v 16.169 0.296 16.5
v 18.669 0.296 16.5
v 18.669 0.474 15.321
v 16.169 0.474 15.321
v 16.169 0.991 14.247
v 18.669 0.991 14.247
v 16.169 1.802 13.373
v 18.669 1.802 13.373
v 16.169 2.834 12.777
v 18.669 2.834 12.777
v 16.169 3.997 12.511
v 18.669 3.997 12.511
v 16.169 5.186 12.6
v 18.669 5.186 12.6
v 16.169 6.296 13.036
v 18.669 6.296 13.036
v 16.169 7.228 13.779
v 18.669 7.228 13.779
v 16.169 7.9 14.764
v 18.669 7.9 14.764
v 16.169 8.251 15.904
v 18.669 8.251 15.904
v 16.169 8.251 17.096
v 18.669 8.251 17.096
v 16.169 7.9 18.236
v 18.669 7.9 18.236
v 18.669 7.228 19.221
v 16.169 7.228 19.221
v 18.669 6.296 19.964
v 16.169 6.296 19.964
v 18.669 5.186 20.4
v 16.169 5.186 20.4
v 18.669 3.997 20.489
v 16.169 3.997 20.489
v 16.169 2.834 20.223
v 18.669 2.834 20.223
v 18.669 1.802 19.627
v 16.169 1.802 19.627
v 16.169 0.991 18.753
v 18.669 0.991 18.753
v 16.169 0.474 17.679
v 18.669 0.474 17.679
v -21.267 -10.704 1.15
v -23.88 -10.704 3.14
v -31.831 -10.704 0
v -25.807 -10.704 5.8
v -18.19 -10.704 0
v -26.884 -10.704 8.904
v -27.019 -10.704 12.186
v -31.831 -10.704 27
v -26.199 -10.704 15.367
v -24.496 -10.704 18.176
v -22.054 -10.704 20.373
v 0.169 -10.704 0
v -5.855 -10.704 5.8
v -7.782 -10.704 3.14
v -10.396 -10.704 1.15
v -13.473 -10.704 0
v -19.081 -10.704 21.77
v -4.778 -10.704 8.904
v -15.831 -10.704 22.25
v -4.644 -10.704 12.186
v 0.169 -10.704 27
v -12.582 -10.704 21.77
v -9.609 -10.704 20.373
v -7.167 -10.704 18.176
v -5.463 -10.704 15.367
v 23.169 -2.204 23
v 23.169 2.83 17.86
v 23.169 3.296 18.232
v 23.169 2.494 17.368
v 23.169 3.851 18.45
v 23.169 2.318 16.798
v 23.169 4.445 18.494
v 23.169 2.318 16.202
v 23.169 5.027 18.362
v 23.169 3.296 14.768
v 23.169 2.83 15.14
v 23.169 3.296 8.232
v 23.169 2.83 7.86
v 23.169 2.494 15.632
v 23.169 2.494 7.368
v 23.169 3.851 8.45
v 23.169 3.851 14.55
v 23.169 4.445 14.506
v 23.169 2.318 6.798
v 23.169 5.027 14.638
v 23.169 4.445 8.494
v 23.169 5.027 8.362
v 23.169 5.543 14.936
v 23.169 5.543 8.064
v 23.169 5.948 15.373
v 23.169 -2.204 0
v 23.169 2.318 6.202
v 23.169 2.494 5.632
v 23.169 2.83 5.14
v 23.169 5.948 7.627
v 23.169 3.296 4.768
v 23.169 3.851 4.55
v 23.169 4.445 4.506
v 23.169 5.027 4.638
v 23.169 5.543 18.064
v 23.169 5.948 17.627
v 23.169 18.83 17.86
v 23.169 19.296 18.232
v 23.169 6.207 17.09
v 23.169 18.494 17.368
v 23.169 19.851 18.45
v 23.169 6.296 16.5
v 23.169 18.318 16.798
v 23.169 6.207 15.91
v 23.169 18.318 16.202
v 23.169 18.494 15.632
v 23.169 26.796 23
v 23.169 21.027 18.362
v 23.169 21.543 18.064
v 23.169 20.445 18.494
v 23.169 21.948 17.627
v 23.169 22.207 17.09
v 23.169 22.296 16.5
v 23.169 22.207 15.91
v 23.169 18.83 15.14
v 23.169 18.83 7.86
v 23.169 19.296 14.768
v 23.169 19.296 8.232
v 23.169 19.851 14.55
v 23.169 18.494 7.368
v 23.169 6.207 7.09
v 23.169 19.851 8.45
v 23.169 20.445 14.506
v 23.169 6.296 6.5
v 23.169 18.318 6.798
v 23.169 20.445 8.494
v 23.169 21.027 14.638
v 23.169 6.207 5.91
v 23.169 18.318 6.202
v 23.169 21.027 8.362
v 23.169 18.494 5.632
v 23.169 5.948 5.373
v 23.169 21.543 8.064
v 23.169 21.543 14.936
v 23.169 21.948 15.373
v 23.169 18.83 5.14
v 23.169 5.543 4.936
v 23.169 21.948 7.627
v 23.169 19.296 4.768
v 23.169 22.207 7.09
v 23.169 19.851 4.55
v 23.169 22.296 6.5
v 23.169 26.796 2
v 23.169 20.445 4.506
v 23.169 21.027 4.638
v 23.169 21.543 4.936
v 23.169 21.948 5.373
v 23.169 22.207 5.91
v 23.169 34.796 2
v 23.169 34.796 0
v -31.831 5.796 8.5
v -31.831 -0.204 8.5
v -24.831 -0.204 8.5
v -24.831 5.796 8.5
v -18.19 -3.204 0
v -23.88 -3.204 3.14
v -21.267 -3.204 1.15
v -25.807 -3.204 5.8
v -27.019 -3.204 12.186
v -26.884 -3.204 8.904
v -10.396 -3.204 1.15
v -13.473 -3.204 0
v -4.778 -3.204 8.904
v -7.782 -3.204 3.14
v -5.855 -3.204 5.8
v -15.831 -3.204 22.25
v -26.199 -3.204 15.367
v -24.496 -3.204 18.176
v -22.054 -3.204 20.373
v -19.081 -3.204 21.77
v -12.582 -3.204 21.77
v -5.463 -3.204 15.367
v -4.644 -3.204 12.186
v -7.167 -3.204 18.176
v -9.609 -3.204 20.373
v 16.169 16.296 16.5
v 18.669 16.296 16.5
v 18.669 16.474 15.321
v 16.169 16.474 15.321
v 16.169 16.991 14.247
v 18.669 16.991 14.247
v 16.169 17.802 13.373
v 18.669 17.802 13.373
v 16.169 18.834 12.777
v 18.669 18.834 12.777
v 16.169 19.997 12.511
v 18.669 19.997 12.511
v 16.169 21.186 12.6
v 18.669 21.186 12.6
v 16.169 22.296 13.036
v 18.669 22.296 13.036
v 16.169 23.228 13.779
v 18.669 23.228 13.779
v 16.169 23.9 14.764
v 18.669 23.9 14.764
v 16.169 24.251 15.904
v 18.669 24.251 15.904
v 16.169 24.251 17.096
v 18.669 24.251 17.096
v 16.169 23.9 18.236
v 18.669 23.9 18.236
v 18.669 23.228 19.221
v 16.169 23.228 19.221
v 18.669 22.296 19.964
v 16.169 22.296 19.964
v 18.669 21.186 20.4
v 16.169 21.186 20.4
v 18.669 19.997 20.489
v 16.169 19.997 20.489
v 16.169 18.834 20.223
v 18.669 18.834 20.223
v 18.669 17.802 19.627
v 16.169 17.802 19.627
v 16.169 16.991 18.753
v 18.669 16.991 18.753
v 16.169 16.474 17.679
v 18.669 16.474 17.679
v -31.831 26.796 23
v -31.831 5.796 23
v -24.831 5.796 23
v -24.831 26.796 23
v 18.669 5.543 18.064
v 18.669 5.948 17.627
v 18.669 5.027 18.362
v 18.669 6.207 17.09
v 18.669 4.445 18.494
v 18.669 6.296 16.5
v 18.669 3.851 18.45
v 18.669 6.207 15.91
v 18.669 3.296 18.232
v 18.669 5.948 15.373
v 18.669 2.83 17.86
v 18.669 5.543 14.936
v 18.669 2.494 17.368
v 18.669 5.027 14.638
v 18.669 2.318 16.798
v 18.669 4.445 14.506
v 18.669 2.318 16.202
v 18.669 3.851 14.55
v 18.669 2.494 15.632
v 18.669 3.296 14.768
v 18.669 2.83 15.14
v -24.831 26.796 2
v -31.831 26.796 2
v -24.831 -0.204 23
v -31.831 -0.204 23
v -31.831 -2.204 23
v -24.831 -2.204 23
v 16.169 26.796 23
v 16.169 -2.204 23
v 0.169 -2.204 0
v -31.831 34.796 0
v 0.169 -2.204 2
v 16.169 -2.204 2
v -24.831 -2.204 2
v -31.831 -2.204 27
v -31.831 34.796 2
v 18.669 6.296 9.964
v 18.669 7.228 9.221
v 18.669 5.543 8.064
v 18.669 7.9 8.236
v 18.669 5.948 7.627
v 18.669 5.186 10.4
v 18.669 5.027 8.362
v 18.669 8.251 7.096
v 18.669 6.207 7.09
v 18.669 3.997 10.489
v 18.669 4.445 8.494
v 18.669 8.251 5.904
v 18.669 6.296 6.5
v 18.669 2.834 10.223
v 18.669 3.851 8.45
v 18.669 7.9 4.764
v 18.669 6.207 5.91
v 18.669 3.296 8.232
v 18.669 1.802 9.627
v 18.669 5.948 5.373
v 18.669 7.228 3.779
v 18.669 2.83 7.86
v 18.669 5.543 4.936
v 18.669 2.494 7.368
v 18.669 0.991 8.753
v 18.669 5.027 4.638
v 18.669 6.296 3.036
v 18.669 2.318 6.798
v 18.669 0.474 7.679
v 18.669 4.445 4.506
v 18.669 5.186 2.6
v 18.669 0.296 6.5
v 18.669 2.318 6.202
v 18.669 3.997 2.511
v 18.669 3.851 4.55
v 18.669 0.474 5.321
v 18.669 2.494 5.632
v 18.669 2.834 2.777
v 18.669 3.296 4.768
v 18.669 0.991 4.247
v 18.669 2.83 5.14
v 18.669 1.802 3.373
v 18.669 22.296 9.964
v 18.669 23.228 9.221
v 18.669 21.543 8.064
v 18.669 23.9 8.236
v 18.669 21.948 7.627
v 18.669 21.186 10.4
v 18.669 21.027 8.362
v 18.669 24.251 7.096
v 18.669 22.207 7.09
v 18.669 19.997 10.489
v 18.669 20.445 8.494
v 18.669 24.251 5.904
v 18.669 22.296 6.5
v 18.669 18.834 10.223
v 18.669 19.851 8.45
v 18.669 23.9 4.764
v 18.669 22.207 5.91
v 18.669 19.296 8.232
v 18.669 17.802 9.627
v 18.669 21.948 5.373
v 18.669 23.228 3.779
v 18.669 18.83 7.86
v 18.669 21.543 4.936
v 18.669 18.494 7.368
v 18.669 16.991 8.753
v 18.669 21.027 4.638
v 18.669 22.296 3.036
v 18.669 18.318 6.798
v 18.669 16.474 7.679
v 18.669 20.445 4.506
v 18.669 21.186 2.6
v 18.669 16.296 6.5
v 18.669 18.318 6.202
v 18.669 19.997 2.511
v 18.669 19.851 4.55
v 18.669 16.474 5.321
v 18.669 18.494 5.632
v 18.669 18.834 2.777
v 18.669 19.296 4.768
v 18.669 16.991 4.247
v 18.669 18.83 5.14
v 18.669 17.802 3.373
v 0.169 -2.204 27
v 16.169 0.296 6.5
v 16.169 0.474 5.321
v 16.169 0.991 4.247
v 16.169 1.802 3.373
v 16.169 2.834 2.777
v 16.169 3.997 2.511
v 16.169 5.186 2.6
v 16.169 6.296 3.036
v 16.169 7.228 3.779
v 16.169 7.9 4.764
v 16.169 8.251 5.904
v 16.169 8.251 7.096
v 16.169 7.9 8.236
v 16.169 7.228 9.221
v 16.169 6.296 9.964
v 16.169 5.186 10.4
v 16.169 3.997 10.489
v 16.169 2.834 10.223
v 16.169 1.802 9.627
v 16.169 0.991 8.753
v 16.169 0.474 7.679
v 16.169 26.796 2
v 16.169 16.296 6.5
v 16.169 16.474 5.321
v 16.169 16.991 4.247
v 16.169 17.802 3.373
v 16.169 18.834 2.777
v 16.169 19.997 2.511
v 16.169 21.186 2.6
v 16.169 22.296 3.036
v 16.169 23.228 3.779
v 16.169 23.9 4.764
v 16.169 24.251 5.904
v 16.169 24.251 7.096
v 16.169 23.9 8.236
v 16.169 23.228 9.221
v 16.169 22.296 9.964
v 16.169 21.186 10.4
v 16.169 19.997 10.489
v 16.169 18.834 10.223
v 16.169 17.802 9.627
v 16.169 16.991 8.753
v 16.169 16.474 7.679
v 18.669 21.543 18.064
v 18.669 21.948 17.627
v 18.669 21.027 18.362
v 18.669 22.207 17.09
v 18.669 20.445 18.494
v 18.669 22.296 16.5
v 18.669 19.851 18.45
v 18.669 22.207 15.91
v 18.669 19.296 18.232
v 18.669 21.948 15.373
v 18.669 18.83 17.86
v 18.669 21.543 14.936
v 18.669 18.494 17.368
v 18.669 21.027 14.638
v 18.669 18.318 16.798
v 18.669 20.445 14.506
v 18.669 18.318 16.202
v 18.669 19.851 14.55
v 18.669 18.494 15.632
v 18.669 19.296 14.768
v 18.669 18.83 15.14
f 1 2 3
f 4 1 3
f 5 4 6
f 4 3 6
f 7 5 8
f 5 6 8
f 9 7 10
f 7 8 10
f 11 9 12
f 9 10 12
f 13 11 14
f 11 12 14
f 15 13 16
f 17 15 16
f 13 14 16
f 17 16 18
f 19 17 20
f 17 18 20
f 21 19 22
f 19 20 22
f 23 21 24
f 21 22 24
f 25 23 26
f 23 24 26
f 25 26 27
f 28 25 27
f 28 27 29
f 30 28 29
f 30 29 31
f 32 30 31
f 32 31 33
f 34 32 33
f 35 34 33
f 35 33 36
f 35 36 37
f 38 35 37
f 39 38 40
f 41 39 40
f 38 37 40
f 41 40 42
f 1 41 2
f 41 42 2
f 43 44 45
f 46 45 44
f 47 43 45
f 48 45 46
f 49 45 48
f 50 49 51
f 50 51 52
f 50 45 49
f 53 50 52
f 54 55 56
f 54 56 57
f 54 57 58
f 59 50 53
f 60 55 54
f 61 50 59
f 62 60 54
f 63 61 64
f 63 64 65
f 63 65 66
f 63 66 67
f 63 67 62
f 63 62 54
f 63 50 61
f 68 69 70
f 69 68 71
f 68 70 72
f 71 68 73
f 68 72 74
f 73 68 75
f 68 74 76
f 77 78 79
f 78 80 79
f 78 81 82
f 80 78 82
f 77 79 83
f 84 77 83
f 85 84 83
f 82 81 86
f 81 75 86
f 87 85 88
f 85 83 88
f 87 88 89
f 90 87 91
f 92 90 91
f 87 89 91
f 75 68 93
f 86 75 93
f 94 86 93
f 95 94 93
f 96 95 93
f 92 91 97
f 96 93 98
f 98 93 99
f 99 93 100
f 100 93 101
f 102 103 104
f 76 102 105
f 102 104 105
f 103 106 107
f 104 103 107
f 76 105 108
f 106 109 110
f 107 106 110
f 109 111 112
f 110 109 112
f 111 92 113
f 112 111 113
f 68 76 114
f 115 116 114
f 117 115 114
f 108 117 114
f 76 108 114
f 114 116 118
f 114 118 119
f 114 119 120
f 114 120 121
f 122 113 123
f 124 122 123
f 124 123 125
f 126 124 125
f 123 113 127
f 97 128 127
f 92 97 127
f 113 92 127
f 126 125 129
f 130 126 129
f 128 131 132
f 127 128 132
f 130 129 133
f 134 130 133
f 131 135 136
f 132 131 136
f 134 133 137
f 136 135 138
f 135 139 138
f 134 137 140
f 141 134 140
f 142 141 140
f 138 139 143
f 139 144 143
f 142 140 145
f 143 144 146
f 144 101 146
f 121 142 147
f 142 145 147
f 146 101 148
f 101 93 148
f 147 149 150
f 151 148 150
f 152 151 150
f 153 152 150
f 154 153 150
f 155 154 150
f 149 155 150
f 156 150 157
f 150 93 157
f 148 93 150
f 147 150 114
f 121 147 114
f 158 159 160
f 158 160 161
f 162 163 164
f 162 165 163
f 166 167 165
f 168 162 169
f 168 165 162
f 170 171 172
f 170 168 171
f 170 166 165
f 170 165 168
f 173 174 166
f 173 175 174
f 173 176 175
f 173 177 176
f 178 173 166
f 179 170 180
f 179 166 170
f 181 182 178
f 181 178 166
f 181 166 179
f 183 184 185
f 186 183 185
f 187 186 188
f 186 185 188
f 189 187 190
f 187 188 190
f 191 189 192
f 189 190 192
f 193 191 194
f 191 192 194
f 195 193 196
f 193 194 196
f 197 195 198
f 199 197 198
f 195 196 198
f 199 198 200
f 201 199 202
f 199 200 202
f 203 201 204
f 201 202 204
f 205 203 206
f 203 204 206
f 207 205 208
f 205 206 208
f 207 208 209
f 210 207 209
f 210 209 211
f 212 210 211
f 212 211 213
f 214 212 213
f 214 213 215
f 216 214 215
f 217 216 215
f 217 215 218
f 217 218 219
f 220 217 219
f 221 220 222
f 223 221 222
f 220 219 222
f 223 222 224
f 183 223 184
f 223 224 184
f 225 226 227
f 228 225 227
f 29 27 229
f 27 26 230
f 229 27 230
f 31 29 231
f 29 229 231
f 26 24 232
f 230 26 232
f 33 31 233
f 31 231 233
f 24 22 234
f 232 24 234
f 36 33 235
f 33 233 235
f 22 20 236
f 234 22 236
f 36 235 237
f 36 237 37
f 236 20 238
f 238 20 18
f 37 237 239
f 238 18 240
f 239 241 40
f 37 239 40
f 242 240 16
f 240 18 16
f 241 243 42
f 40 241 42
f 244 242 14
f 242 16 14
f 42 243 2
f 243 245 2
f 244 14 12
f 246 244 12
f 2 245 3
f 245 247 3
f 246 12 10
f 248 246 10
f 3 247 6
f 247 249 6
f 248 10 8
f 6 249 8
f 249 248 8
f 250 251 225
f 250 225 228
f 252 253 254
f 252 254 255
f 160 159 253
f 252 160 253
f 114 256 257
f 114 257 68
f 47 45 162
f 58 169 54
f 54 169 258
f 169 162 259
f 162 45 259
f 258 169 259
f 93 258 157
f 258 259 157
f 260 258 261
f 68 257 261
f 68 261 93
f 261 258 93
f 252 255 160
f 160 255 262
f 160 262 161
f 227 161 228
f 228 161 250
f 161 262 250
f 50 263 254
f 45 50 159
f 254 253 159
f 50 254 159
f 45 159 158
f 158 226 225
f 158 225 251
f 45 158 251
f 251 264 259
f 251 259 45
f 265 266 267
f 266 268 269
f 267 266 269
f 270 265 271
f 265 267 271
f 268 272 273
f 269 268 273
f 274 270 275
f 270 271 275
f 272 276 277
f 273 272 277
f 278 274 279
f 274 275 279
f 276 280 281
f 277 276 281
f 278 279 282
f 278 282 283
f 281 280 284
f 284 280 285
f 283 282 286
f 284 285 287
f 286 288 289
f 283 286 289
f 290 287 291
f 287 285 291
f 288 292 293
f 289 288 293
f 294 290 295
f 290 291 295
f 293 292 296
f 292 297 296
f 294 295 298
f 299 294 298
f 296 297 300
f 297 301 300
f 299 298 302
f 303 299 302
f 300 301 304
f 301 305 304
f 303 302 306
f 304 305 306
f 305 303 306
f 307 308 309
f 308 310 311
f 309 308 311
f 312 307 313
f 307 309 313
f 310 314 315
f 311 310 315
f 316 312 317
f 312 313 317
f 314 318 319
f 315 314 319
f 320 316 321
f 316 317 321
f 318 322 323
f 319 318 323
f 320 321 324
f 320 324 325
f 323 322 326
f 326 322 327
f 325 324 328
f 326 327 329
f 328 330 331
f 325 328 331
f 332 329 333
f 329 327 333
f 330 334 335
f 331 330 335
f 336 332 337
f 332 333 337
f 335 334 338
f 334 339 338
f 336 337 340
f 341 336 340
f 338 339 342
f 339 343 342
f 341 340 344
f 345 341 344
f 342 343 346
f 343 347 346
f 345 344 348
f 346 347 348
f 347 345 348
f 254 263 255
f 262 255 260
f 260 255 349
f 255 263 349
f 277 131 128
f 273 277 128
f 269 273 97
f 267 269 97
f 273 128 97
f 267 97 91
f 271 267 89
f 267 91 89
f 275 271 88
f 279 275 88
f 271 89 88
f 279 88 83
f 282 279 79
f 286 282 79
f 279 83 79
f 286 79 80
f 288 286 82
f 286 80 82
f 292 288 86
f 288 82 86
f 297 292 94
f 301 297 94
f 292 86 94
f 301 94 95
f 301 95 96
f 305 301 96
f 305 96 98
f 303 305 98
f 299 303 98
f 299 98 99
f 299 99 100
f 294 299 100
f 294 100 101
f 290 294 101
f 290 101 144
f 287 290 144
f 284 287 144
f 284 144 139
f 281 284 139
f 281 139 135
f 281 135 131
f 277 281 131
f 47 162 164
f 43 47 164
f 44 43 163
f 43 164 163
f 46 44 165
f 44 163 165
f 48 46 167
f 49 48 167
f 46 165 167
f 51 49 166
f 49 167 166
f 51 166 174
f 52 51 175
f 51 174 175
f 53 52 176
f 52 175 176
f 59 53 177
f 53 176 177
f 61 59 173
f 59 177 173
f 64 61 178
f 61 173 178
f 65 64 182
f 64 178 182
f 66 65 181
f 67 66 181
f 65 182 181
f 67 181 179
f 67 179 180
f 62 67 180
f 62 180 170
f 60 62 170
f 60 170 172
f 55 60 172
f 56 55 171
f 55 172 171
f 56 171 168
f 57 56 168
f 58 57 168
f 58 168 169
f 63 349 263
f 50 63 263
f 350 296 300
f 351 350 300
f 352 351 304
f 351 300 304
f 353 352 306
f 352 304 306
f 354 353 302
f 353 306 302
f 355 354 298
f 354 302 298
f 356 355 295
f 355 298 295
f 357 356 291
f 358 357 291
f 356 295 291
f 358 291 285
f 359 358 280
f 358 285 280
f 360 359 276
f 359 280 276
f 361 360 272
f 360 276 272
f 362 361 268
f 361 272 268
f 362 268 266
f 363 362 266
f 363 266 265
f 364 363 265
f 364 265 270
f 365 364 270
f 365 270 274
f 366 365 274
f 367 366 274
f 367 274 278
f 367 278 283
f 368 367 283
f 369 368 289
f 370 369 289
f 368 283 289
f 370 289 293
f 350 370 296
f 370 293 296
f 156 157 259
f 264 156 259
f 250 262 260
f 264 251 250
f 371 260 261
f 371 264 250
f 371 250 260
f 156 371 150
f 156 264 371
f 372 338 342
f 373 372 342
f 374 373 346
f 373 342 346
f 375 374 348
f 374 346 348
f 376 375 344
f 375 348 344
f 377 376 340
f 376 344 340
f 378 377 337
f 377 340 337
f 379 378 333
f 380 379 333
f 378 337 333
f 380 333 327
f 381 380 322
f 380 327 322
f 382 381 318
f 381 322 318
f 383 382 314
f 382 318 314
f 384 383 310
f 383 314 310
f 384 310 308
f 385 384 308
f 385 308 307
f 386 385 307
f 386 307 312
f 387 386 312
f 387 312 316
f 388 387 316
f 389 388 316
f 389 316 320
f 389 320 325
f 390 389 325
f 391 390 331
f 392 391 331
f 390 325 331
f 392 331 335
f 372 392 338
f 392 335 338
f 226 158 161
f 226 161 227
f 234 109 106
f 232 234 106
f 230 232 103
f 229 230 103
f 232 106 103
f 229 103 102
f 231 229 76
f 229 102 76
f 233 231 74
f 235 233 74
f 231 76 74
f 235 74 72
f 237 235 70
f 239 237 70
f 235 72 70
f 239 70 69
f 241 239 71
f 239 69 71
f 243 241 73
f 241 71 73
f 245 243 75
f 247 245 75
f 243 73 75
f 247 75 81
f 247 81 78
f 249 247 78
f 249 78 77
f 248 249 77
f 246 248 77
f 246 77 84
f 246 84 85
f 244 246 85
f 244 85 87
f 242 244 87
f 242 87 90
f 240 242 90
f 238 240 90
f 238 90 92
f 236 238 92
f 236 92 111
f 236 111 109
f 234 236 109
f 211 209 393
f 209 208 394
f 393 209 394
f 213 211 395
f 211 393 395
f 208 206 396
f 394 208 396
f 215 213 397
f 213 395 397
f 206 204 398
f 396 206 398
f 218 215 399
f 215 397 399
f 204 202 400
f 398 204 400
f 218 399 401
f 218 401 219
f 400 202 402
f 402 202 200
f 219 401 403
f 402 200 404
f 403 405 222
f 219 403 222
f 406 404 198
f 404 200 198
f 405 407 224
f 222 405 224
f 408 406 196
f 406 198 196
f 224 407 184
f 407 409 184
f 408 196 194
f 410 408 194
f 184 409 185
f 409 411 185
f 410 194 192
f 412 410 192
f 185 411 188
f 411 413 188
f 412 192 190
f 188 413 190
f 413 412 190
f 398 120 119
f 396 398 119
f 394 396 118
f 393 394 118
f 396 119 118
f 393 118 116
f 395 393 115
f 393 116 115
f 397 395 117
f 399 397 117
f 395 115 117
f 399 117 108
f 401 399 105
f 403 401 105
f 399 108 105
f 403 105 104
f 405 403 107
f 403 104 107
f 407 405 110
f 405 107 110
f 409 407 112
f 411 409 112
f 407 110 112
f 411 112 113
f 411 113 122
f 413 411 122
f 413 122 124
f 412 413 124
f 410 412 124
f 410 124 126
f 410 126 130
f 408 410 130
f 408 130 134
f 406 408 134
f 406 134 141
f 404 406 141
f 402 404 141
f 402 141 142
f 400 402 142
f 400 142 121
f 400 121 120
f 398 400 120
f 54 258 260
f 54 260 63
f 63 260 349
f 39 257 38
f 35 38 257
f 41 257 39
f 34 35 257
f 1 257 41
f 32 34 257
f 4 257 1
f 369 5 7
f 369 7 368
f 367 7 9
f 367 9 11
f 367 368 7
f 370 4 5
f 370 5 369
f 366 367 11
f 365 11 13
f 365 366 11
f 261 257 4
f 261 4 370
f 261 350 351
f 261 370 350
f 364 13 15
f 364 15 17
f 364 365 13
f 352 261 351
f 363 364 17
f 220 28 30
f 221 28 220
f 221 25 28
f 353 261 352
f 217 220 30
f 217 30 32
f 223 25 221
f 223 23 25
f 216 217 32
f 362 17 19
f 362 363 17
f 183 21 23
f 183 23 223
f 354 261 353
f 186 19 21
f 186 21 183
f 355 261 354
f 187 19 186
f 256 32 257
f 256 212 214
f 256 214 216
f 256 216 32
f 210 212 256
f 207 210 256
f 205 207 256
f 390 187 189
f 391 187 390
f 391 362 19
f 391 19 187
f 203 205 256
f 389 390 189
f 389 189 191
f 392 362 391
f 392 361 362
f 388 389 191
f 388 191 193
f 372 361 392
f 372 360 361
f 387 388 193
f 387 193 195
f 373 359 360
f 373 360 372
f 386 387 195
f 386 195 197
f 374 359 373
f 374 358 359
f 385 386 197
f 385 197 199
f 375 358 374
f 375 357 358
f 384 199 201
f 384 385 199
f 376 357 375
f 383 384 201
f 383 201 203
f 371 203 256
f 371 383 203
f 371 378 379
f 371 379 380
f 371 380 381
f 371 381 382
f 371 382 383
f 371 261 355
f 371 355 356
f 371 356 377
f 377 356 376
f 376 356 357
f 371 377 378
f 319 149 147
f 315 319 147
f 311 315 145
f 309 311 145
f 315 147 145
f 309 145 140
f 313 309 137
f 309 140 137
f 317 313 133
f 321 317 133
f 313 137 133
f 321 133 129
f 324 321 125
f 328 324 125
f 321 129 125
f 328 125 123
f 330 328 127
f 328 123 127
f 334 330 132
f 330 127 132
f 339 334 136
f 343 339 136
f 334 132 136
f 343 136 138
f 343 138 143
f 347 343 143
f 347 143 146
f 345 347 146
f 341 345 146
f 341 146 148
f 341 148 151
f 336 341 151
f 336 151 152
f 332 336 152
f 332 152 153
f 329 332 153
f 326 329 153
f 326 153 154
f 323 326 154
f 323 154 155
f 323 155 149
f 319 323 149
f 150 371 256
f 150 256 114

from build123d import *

# Parameters (mm, degrees)
SKETCH1_W            = 7
SKETCH1_H            = 29
SIDES_DEPTH          = 23
SIDES_2_DEPTH        = 23
BACK_PLATE_DEPTH     = 2
SKETCH2_W            = 32
SKETCH2_H            = 27
BEARING_BASE_DEPTH   = 1
SKETCH3_W            = 14.5
SKETCH3_H            = 6
WIRE_2_DEPTH         = 21
BEARING_START        = 1
BEARING_DEPTH        = 7.5
MOUTNING_HOLES_R     = 2
SCREW_HOLES_DEPTH    = 10
SCREW_START          = -4.5
MOUTNING_HOLES_3_R   = 4
MOUTNING_HOLES_3_R_2 = 2
SCREW_HEADS_DEPTH    = 2.5


# Read off the part's stored shape, not the designer's step: Bearing
with BuildPart() as part:
    # Sketch1 → Sides (new body)
    with BuildSketch(Plane.XY):
        with Locations((-28.331246011, 12.295832375)):
            Rectangle(SKETCH1_W, SKETCH1_H)
    extrude(amount=SIDES_DEPTH)



with BuildPart() as body_2:
    # Sketch1 → Sides 2 (new body)
    with BuildSketch(Plane.XY):
        with Locations((19.668753989, 12.295832375)):
            Rectangle(SKETCH1_W, SKETCH1_H)
    extrude(amount=SIDES_2_DEPTH)


with BuildPart() as part_1:
    add(part.part)

    add(body_2.part)  # Back Plate merges body 2
    # Sketch1<3> → Back Plate (add)
    with BuildSketch(Plane.XY):
        Polygon((-4.331246011, -2.204167625), (-4.331246011, 34.795832375), (-31.831246011, 34.795832375), (-31.831246011, 26.795832375), (-24.831246011, 26.795832375), (-24.831246011, -2.204167625), align=None)
        Polygon((23.168753989, 34.795832375), (-4.331246011, 34.795832375), (-4.331246011, -2.204167625), (16.168753989, -2.204167625), (16.168753989, 26.795832375), (23.168753989, 26.795832375), align=None)
    extrude(amount=BACK_PLATE_DEPTH)

    # Sketch2 → Bearing Base (add)
    with BuildSketch(Plane.XZ.offset(2.204167625)):
        with Locations((-15.831246011, 13.5)):
            Rectangle(SKETCH2_W, SKETCH2_H)
    extrude(amount=BEARING_BASE_DEPTH)

    # Sketch3 → Wire 2 (cut)
    with BuildSketch(Plane.ZY.offset(31.831246011)):
        with Locations((15.75, 2.795832375)):
            Rectangle(SKETCH3_W, SKETCH3_H)
    extrude(amount=-WIRE_2_DEPTH, mode=Mode.SUBTRACT)

    # Bearing outline → Bearing (add)
    with BuildSketch(Plane.XZ.offset(2.204167625).offset(BEARING_START)):
        with BuildLine():
            Line((-31.831246011, 27), (-31.831246011, 0))
            Line((-31.831246011, 0), (-18.189741294, 0))
            ThreePointArc((-18.189741294, 0), (-15.831246011, 22.25), (-13.472750728, 0))
            Line((-13.472750728, 0), (0.168753989, 0))
            Line((0.168753989, 0), (0.168753989, 27))
            Line((0.168753989, 27), (-31.831246011, 27))
        make_face()
    extrude(amount=BEARING_DEPTH)

    # Moutning Holes → Screw Holes (cut)
    with BuildSketch(Plane(origin=(23.168753989, 0, 0), x_dir=(0, 0, -1), z_dir=(1, 0, 0))):
        with Locations(Location((-6.5, 4.295832375, 0), (0, 0, 90))):
            Circle(MOUTNING_HOLES_R)
        with Locations(Location((-16.5, 4.295832375, 0), (0, 0, 90))):
            Circle(MOUTNING_HOLES_R)
        with Locations(Location((-16.5, 20.295832375, 0), (0, 0, 90))):
            Circle(MOUTNING_HOLES_R)
        with Locations(Location((-6.5, 20.295832375, 0), (0, 0, 90))):
            Circle(MOUTNING_HOLES_R)
    extrude(amount=-SCREW_HOLES_DEPTH, mode=Mode.SUBTRACT)

    # Moutning Holes<3> → Screw Heads (cut)
    # profile 1 of 4: a face of its own
    with BuildSketch(Plane(origin=(23.168753989, 0, 0), x_dir=(0, 0, -1), z_dir=(1, 0, 0)).offset(SCREW_START)):
        with Locations(Location((-6.5, 4.295832375, 0), (0, 0, 270))):
            Circle(MOUTNING_HOLES_3_R)
        with Locations(Location((-6.5, 4.295832375, 0), (0, 0, 90))):
            Circle(MOUTNING_HOLES_3_R_2, mode=Mode.SUBTRACT)
    # profile 2 of 4: a face of its own
    with BuildSketch(Plane(origin=(23.168753989, 0, 0), x_dir=(0, 0, -1), z_dir=(1, 0, 0)).offset(SCREW_START)):
        with Locations(Location((-16.5, 4.295832375, 0), (0, 0, 270))):
            Circle(MOUTNING_HOLES_3_R)
        with Locations(Location((-16.5, 4.295832375, 0), (0, 0, 90))):
            Circle(MOUTNING_HOLES_3_R_2, mode=Mode.SUBTRACT)
    # profile 3 of 4: a face of its own
    with BuildSketch(Plane(origin=(23.168753989, 0, 0), x_dir=(0, 0, -1), z_dir=(1, 0, 0)).offset(SCREW_START)):
        with Locations(Location((-16.5, 20.295832375, 0), (0, 0, 270))):
            Circle(MOUTNING_HOLES_3_R)
        with Locations(Location((-16.5, 20.295832375, 0), (0, 0, 90))):
            Circle(MOUTNING_HOLES_3_R_2, mode=Mode.SUBTRACT)
    # profile 4 of 4: a face of its own
    with BuildSketch(Plane(origin=(23.168753989, 0, 0), x_dir=(0, 0, -1), z_dir=(1, 0, 0)).offset(SCREW_START)):
        with Locations(Location((-6.5, 20.295832375, 0), (0, 0, 270))):
            Circle(MOUTNING_HOLES_3_R)
        with Locations(Location((-6.5, 20.295832375, 0), (0, 0, 90))):
            Circle(MOUTNING_HOLES_3_R_2, mode=Mode.SUBTRACT)
    extrude(amount=-SCREW_HEADS_DEPTH, mode=Mode.SUBTRACT)


solid = part_1.part
